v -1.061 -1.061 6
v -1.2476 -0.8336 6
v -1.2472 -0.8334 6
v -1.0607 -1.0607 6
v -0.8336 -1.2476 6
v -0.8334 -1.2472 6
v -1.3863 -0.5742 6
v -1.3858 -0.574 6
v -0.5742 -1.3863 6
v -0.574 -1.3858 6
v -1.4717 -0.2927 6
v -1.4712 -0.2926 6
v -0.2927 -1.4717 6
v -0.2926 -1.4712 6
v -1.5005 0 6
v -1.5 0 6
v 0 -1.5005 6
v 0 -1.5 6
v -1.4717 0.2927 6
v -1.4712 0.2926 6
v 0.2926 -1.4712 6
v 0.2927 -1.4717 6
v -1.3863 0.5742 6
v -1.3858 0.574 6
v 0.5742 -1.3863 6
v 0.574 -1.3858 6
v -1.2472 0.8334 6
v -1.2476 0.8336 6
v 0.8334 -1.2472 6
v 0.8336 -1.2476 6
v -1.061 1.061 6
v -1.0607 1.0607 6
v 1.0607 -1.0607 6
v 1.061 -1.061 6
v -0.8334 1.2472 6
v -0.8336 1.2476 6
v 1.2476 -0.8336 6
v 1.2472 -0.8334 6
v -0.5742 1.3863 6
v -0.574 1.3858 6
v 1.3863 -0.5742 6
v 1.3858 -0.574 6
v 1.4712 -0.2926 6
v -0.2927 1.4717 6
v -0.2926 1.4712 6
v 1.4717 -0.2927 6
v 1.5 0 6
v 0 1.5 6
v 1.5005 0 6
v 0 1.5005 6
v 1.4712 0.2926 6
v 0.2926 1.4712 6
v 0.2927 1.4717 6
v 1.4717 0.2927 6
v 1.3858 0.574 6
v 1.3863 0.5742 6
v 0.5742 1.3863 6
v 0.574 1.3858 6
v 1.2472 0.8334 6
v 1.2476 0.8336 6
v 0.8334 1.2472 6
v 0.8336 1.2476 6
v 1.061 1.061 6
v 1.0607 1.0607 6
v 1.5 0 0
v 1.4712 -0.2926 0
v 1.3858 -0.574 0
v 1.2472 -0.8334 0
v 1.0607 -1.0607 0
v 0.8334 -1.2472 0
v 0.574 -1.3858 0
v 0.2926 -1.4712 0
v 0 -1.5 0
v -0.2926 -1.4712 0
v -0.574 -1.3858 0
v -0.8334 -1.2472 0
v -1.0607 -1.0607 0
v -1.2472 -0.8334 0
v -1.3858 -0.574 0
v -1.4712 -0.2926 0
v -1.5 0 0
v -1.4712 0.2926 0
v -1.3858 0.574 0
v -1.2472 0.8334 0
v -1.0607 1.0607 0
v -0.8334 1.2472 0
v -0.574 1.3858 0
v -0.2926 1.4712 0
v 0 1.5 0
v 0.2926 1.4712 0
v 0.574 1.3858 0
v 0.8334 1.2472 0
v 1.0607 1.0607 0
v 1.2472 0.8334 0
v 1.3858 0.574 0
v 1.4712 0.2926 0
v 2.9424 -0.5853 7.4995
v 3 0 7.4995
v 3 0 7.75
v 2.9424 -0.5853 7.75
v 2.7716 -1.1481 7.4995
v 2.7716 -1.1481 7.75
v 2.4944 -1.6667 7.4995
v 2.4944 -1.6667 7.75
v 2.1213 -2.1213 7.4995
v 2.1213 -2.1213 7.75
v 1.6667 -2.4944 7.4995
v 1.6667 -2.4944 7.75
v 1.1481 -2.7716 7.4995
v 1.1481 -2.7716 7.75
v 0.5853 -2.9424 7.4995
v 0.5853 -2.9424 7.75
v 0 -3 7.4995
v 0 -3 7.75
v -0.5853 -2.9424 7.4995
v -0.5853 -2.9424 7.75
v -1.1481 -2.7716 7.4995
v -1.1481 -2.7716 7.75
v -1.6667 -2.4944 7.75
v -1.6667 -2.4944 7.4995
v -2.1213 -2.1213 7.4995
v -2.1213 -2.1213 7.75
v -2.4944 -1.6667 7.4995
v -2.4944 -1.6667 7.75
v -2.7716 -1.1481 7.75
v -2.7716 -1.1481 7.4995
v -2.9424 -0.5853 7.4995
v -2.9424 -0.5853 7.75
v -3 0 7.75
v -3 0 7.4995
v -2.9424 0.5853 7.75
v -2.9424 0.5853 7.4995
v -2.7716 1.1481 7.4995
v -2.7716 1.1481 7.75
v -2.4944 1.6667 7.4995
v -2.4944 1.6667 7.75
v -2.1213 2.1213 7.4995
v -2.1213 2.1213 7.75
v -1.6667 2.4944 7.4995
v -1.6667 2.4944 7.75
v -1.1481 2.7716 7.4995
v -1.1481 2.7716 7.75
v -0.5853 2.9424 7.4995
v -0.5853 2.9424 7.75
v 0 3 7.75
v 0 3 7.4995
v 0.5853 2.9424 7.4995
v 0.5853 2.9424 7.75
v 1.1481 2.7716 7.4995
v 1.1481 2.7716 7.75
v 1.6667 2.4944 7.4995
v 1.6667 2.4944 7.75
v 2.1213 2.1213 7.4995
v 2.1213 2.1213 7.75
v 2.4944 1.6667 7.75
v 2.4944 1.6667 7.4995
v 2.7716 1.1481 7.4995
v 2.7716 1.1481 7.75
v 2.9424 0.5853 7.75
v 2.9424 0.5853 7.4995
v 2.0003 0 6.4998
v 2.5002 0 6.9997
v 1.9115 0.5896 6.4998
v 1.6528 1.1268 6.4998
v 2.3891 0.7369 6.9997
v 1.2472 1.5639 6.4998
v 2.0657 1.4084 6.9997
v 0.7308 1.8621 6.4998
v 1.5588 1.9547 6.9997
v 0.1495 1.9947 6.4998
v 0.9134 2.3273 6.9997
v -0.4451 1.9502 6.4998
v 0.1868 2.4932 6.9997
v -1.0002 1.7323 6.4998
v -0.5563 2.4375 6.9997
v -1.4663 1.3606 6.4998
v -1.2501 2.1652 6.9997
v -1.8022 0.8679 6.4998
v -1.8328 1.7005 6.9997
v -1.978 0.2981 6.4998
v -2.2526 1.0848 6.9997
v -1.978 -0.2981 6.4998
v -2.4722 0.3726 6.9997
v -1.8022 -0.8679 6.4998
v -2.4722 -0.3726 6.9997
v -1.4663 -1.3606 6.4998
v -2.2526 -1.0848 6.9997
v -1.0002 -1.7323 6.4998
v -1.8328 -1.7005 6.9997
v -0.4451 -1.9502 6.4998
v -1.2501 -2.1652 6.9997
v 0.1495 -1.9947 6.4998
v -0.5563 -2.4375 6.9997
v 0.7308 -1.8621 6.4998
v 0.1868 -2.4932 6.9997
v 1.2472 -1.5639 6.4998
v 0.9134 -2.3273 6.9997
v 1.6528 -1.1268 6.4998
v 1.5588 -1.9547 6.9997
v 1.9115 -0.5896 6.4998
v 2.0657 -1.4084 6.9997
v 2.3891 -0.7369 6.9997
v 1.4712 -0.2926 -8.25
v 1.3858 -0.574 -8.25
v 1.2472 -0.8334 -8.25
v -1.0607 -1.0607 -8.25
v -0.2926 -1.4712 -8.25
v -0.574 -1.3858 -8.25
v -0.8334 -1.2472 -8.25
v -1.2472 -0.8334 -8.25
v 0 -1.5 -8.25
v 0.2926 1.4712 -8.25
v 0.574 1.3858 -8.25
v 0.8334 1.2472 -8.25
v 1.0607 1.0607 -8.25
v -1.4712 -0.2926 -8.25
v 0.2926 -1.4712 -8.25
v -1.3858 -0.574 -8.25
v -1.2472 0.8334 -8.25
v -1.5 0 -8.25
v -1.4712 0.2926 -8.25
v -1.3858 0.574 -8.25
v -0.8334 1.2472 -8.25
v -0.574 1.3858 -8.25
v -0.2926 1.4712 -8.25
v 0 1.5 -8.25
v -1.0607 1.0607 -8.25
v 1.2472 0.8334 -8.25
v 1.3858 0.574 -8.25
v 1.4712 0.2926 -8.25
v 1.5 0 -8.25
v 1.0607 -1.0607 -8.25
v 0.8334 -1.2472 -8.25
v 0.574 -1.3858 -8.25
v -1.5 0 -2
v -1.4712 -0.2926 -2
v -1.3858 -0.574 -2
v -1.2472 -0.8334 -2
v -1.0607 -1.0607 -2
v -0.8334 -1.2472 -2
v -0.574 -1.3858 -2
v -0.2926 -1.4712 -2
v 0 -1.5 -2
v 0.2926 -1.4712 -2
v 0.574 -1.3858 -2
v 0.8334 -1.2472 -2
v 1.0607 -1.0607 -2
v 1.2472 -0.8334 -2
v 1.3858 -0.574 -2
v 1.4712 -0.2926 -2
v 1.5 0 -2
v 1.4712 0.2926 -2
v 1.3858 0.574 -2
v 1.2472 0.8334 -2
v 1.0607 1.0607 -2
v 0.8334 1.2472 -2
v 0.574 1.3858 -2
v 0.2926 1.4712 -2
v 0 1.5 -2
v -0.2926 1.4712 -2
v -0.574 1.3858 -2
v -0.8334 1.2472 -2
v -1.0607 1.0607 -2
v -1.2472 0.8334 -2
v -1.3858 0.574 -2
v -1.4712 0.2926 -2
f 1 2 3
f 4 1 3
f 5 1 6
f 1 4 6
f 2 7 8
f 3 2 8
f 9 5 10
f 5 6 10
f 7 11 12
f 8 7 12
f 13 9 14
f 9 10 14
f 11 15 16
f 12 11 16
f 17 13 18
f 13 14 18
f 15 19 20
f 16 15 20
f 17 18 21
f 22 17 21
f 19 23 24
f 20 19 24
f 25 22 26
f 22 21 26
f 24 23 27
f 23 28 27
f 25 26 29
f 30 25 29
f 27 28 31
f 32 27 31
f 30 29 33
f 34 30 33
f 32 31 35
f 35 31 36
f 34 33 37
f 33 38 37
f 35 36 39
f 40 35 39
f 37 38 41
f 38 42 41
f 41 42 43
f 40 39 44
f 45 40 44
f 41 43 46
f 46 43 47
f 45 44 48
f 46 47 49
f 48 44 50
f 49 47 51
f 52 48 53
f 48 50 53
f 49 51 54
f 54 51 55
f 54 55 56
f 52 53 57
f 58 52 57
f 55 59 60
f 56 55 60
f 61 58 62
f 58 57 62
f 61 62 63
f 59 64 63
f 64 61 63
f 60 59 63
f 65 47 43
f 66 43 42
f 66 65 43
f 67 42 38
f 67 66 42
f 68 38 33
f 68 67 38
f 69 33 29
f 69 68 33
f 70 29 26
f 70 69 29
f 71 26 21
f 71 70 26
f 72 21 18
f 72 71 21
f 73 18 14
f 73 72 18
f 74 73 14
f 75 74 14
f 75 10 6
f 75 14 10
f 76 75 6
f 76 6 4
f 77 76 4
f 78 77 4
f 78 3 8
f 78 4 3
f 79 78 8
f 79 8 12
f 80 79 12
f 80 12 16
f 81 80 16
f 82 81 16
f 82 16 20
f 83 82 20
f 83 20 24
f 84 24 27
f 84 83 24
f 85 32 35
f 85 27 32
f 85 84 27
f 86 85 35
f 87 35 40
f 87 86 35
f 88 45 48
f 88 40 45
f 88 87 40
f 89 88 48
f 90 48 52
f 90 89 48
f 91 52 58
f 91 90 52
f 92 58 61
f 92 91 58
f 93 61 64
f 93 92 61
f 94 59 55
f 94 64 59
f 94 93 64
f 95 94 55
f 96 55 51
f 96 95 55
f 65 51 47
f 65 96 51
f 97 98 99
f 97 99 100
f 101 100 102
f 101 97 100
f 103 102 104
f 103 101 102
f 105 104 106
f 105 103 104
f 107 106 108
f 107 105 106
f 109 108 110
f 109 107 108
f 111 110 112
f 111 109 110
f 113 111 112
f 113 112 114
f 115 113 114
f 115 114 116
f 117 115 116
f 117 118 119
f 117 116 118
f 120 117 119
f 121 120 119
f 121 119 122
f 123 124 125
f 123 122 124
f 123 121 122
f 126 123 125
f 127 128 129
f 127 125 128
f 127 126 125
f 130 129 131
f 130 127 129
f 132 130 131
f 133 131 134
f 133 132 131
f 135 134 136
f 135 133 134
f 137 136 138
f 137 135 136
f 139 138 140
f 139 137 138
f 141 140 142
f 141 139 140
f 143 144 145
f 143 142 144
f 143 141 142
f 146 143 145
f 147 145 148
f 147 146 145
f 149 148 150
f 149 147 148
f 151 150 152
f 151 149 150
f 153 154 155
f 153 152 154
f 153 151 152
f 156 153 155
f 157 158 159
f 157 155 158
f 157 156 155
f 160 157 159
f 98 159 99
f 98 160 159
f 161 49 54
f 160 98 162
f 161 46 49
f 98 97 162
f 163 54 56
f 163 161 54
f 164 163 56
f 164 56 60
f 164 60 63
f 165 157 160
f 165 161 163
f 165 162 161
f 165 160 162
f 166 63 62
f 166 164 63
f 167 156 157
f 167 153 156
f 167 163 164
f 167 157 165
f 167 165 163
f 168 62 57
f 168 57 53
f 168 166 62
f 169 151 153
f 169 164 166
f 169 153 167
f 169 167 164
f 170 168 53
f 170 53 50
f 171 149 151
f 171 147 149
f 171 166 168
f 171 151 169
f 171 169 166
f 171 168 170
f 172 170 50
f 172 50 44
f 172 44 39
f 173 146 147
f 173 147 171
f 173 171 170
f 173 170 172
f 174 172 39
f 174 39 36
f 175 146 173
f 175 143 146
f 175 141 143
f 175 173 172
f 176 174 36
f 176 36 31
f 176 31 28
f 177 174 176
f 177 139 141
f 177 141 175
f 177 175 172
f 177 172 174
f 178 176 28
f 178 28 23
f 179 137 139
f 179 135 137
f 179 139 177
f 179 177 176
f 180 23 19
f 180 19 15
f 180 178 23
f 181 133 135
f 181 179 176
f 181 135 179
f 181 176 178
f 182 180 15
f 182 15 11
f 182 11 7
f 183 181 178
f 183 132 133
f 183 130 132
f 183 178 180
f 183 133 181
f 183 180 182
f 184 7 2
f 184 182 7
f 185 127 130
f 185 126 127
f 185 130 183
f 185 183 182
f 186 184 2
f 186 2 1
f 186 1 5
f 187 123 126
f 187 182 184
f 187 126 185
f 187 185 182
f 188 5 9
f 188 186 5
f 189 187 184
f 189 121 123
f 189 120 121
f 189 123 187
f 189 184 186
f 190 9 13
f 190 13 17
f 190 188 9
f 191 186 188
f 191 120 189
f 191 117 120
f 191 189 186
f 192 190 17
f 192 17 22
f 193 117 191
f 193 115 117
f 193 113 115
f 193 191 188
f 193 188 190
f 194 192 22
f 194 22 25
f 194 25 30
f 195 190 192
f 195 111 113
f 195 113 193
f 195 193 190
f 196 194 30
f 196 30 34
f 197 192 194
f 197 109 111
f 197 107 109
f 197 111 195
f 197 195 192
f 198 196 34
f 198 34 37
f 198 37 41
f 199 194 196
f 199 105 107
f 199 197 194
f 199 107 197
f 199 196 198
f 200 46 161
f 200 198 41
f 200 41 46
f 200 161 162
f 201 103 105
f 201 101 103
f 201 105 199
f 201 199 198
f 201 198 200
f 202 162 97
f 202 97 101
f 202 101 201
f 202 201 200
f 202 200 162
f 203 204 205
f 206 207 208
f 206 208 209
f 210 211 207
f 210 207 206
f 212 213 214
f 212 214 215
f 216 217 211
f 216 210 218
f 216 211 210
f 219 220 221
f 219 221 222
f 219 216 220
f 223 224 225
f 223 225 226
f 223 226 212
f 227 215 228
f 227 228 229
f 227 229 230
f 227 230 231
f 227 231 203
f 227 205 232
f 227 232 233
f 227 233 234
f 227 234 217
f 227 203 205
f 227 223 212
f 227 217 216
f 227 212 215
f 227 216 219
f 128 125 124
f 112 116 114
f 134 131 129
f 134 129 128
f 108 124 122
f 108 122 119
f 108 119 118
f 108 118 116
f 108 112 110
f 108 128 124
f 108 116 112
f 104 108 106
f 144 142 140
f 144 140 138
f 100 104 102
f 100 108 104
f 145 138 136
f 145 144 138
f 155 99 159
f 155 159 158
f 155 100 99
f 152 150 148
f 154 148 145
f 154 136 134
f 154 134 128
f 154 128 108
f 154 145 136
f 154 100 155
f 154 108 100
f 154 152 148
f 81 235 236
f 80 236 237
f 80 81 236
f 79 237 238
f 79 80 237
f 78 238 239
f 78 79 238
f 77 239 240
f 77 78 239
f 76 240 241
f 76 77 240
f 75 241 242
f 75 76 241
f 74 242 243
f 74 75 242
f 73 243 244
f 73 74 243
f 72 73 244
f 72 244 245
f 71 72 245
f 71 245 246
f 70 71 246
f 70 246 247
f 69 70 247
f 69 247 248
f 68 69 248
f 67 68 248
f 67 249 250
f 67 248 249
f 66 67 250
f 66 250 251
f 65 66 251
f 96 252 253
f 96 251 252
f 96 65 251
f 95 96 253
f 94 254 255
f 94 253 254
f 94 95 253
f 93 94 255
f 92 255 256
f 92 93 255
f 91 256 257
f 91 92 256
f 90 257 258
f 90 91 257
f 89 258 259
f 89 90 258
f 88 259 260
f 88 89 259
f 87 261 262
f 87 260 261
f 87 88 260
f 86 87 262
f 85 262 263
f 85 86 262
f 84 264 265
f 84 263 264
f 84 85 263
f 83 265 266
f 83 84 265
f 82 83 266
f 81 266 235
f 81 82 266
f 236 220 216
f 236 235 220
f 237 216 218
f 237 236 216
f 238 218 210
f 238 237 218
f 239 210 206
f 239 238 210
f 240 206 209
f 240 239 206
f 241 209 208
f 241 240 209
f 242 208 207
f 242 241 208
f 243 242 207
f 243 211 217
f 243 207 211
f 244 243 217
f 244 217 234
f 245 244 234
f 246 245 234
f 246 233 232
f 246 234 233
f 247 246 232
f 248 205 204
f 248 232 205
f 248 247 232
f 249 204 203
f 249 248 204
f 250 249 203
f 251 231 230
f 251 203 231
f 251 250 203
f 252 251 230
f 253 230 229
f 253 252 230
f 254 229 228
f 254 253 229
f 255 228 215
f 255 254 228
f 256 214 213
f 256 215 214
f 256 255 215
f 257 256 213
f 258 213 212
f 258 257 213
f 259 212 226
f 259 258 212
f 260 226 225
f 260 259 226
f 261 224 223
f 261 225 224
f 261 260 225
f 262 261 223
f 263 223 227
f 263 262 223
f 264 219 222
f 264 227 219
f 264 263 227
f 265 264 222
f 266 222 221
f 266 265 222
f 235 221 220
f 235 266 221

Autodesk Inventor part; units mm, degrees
ref_plane "YZ Plane" through (0, 0, 0) normal (1, 0, 0) x (0, 1, 0)
ref_plane "XZ Plane" through (0, 0, 0) normal (0, 1, 0) x (-1, 0, 0)
ref_plane "XY Plane" through (0, 0, 0) normal (0, 0, 1) x (1, 0, 0)
sketch "スケッチ1" plane through (0, 0, 0) normal (0, 0, 1) x (1, 0, 0)
  circle A0 centre (0, 0) radius 1.5
  dimension "d0" = 3
extrude "押し出し1" add sketch "スケッチ1" along normal blind 6
sketch "スケッチ2" plane through (0, 0, 6) normal (0, 0, 1) x (1, 0, 0)
  circle A0 centre (0, 0) radius 1.5 projected
  circle A1 centre (0, 0) radius 3
  dimension "d3" = 6
extrude "押し出し2" add sketch "スケッチ2" along normal blind 1.75 contours A0 | A1
thread "ねじ1" size "M3x0.5" class "6g" standard "ANSI Metric M Profile" full length
chamfer "面取り1" distance 1.5 angle 45 1 edges at (-3, 0, 6)
sketch "スケッチ4" plane through (0, 0, 0) normal (0, 0, -1) x (-1, 0, 0)
  circle A0 centre (0, 0) radius 1.5 projected
extrude "押し出し4" add sketch "スケッチ4" along normal blind 4
sketch "スケッチ5" plane through (0, 0, -4) normal (0, 0, -1) x (-1, 0, 0)
  circle A0 centre (0, 0) radius 1.5 projected
extrude "押し出し5" cut sketch "スケッチ5" against normal blind 2
sketch "スケッチ6" plane through (0, 0, -2) normal (0, 0, -1) x (-1, 0, 0)
  circle A0 centre (0, 0) radius 1.5 projected
extrude "押し出し6" add sketch "スケッチ6" along normal blind 6.25
properties part number "SB　16mm皿ネジ" material "Steel, Mild"
